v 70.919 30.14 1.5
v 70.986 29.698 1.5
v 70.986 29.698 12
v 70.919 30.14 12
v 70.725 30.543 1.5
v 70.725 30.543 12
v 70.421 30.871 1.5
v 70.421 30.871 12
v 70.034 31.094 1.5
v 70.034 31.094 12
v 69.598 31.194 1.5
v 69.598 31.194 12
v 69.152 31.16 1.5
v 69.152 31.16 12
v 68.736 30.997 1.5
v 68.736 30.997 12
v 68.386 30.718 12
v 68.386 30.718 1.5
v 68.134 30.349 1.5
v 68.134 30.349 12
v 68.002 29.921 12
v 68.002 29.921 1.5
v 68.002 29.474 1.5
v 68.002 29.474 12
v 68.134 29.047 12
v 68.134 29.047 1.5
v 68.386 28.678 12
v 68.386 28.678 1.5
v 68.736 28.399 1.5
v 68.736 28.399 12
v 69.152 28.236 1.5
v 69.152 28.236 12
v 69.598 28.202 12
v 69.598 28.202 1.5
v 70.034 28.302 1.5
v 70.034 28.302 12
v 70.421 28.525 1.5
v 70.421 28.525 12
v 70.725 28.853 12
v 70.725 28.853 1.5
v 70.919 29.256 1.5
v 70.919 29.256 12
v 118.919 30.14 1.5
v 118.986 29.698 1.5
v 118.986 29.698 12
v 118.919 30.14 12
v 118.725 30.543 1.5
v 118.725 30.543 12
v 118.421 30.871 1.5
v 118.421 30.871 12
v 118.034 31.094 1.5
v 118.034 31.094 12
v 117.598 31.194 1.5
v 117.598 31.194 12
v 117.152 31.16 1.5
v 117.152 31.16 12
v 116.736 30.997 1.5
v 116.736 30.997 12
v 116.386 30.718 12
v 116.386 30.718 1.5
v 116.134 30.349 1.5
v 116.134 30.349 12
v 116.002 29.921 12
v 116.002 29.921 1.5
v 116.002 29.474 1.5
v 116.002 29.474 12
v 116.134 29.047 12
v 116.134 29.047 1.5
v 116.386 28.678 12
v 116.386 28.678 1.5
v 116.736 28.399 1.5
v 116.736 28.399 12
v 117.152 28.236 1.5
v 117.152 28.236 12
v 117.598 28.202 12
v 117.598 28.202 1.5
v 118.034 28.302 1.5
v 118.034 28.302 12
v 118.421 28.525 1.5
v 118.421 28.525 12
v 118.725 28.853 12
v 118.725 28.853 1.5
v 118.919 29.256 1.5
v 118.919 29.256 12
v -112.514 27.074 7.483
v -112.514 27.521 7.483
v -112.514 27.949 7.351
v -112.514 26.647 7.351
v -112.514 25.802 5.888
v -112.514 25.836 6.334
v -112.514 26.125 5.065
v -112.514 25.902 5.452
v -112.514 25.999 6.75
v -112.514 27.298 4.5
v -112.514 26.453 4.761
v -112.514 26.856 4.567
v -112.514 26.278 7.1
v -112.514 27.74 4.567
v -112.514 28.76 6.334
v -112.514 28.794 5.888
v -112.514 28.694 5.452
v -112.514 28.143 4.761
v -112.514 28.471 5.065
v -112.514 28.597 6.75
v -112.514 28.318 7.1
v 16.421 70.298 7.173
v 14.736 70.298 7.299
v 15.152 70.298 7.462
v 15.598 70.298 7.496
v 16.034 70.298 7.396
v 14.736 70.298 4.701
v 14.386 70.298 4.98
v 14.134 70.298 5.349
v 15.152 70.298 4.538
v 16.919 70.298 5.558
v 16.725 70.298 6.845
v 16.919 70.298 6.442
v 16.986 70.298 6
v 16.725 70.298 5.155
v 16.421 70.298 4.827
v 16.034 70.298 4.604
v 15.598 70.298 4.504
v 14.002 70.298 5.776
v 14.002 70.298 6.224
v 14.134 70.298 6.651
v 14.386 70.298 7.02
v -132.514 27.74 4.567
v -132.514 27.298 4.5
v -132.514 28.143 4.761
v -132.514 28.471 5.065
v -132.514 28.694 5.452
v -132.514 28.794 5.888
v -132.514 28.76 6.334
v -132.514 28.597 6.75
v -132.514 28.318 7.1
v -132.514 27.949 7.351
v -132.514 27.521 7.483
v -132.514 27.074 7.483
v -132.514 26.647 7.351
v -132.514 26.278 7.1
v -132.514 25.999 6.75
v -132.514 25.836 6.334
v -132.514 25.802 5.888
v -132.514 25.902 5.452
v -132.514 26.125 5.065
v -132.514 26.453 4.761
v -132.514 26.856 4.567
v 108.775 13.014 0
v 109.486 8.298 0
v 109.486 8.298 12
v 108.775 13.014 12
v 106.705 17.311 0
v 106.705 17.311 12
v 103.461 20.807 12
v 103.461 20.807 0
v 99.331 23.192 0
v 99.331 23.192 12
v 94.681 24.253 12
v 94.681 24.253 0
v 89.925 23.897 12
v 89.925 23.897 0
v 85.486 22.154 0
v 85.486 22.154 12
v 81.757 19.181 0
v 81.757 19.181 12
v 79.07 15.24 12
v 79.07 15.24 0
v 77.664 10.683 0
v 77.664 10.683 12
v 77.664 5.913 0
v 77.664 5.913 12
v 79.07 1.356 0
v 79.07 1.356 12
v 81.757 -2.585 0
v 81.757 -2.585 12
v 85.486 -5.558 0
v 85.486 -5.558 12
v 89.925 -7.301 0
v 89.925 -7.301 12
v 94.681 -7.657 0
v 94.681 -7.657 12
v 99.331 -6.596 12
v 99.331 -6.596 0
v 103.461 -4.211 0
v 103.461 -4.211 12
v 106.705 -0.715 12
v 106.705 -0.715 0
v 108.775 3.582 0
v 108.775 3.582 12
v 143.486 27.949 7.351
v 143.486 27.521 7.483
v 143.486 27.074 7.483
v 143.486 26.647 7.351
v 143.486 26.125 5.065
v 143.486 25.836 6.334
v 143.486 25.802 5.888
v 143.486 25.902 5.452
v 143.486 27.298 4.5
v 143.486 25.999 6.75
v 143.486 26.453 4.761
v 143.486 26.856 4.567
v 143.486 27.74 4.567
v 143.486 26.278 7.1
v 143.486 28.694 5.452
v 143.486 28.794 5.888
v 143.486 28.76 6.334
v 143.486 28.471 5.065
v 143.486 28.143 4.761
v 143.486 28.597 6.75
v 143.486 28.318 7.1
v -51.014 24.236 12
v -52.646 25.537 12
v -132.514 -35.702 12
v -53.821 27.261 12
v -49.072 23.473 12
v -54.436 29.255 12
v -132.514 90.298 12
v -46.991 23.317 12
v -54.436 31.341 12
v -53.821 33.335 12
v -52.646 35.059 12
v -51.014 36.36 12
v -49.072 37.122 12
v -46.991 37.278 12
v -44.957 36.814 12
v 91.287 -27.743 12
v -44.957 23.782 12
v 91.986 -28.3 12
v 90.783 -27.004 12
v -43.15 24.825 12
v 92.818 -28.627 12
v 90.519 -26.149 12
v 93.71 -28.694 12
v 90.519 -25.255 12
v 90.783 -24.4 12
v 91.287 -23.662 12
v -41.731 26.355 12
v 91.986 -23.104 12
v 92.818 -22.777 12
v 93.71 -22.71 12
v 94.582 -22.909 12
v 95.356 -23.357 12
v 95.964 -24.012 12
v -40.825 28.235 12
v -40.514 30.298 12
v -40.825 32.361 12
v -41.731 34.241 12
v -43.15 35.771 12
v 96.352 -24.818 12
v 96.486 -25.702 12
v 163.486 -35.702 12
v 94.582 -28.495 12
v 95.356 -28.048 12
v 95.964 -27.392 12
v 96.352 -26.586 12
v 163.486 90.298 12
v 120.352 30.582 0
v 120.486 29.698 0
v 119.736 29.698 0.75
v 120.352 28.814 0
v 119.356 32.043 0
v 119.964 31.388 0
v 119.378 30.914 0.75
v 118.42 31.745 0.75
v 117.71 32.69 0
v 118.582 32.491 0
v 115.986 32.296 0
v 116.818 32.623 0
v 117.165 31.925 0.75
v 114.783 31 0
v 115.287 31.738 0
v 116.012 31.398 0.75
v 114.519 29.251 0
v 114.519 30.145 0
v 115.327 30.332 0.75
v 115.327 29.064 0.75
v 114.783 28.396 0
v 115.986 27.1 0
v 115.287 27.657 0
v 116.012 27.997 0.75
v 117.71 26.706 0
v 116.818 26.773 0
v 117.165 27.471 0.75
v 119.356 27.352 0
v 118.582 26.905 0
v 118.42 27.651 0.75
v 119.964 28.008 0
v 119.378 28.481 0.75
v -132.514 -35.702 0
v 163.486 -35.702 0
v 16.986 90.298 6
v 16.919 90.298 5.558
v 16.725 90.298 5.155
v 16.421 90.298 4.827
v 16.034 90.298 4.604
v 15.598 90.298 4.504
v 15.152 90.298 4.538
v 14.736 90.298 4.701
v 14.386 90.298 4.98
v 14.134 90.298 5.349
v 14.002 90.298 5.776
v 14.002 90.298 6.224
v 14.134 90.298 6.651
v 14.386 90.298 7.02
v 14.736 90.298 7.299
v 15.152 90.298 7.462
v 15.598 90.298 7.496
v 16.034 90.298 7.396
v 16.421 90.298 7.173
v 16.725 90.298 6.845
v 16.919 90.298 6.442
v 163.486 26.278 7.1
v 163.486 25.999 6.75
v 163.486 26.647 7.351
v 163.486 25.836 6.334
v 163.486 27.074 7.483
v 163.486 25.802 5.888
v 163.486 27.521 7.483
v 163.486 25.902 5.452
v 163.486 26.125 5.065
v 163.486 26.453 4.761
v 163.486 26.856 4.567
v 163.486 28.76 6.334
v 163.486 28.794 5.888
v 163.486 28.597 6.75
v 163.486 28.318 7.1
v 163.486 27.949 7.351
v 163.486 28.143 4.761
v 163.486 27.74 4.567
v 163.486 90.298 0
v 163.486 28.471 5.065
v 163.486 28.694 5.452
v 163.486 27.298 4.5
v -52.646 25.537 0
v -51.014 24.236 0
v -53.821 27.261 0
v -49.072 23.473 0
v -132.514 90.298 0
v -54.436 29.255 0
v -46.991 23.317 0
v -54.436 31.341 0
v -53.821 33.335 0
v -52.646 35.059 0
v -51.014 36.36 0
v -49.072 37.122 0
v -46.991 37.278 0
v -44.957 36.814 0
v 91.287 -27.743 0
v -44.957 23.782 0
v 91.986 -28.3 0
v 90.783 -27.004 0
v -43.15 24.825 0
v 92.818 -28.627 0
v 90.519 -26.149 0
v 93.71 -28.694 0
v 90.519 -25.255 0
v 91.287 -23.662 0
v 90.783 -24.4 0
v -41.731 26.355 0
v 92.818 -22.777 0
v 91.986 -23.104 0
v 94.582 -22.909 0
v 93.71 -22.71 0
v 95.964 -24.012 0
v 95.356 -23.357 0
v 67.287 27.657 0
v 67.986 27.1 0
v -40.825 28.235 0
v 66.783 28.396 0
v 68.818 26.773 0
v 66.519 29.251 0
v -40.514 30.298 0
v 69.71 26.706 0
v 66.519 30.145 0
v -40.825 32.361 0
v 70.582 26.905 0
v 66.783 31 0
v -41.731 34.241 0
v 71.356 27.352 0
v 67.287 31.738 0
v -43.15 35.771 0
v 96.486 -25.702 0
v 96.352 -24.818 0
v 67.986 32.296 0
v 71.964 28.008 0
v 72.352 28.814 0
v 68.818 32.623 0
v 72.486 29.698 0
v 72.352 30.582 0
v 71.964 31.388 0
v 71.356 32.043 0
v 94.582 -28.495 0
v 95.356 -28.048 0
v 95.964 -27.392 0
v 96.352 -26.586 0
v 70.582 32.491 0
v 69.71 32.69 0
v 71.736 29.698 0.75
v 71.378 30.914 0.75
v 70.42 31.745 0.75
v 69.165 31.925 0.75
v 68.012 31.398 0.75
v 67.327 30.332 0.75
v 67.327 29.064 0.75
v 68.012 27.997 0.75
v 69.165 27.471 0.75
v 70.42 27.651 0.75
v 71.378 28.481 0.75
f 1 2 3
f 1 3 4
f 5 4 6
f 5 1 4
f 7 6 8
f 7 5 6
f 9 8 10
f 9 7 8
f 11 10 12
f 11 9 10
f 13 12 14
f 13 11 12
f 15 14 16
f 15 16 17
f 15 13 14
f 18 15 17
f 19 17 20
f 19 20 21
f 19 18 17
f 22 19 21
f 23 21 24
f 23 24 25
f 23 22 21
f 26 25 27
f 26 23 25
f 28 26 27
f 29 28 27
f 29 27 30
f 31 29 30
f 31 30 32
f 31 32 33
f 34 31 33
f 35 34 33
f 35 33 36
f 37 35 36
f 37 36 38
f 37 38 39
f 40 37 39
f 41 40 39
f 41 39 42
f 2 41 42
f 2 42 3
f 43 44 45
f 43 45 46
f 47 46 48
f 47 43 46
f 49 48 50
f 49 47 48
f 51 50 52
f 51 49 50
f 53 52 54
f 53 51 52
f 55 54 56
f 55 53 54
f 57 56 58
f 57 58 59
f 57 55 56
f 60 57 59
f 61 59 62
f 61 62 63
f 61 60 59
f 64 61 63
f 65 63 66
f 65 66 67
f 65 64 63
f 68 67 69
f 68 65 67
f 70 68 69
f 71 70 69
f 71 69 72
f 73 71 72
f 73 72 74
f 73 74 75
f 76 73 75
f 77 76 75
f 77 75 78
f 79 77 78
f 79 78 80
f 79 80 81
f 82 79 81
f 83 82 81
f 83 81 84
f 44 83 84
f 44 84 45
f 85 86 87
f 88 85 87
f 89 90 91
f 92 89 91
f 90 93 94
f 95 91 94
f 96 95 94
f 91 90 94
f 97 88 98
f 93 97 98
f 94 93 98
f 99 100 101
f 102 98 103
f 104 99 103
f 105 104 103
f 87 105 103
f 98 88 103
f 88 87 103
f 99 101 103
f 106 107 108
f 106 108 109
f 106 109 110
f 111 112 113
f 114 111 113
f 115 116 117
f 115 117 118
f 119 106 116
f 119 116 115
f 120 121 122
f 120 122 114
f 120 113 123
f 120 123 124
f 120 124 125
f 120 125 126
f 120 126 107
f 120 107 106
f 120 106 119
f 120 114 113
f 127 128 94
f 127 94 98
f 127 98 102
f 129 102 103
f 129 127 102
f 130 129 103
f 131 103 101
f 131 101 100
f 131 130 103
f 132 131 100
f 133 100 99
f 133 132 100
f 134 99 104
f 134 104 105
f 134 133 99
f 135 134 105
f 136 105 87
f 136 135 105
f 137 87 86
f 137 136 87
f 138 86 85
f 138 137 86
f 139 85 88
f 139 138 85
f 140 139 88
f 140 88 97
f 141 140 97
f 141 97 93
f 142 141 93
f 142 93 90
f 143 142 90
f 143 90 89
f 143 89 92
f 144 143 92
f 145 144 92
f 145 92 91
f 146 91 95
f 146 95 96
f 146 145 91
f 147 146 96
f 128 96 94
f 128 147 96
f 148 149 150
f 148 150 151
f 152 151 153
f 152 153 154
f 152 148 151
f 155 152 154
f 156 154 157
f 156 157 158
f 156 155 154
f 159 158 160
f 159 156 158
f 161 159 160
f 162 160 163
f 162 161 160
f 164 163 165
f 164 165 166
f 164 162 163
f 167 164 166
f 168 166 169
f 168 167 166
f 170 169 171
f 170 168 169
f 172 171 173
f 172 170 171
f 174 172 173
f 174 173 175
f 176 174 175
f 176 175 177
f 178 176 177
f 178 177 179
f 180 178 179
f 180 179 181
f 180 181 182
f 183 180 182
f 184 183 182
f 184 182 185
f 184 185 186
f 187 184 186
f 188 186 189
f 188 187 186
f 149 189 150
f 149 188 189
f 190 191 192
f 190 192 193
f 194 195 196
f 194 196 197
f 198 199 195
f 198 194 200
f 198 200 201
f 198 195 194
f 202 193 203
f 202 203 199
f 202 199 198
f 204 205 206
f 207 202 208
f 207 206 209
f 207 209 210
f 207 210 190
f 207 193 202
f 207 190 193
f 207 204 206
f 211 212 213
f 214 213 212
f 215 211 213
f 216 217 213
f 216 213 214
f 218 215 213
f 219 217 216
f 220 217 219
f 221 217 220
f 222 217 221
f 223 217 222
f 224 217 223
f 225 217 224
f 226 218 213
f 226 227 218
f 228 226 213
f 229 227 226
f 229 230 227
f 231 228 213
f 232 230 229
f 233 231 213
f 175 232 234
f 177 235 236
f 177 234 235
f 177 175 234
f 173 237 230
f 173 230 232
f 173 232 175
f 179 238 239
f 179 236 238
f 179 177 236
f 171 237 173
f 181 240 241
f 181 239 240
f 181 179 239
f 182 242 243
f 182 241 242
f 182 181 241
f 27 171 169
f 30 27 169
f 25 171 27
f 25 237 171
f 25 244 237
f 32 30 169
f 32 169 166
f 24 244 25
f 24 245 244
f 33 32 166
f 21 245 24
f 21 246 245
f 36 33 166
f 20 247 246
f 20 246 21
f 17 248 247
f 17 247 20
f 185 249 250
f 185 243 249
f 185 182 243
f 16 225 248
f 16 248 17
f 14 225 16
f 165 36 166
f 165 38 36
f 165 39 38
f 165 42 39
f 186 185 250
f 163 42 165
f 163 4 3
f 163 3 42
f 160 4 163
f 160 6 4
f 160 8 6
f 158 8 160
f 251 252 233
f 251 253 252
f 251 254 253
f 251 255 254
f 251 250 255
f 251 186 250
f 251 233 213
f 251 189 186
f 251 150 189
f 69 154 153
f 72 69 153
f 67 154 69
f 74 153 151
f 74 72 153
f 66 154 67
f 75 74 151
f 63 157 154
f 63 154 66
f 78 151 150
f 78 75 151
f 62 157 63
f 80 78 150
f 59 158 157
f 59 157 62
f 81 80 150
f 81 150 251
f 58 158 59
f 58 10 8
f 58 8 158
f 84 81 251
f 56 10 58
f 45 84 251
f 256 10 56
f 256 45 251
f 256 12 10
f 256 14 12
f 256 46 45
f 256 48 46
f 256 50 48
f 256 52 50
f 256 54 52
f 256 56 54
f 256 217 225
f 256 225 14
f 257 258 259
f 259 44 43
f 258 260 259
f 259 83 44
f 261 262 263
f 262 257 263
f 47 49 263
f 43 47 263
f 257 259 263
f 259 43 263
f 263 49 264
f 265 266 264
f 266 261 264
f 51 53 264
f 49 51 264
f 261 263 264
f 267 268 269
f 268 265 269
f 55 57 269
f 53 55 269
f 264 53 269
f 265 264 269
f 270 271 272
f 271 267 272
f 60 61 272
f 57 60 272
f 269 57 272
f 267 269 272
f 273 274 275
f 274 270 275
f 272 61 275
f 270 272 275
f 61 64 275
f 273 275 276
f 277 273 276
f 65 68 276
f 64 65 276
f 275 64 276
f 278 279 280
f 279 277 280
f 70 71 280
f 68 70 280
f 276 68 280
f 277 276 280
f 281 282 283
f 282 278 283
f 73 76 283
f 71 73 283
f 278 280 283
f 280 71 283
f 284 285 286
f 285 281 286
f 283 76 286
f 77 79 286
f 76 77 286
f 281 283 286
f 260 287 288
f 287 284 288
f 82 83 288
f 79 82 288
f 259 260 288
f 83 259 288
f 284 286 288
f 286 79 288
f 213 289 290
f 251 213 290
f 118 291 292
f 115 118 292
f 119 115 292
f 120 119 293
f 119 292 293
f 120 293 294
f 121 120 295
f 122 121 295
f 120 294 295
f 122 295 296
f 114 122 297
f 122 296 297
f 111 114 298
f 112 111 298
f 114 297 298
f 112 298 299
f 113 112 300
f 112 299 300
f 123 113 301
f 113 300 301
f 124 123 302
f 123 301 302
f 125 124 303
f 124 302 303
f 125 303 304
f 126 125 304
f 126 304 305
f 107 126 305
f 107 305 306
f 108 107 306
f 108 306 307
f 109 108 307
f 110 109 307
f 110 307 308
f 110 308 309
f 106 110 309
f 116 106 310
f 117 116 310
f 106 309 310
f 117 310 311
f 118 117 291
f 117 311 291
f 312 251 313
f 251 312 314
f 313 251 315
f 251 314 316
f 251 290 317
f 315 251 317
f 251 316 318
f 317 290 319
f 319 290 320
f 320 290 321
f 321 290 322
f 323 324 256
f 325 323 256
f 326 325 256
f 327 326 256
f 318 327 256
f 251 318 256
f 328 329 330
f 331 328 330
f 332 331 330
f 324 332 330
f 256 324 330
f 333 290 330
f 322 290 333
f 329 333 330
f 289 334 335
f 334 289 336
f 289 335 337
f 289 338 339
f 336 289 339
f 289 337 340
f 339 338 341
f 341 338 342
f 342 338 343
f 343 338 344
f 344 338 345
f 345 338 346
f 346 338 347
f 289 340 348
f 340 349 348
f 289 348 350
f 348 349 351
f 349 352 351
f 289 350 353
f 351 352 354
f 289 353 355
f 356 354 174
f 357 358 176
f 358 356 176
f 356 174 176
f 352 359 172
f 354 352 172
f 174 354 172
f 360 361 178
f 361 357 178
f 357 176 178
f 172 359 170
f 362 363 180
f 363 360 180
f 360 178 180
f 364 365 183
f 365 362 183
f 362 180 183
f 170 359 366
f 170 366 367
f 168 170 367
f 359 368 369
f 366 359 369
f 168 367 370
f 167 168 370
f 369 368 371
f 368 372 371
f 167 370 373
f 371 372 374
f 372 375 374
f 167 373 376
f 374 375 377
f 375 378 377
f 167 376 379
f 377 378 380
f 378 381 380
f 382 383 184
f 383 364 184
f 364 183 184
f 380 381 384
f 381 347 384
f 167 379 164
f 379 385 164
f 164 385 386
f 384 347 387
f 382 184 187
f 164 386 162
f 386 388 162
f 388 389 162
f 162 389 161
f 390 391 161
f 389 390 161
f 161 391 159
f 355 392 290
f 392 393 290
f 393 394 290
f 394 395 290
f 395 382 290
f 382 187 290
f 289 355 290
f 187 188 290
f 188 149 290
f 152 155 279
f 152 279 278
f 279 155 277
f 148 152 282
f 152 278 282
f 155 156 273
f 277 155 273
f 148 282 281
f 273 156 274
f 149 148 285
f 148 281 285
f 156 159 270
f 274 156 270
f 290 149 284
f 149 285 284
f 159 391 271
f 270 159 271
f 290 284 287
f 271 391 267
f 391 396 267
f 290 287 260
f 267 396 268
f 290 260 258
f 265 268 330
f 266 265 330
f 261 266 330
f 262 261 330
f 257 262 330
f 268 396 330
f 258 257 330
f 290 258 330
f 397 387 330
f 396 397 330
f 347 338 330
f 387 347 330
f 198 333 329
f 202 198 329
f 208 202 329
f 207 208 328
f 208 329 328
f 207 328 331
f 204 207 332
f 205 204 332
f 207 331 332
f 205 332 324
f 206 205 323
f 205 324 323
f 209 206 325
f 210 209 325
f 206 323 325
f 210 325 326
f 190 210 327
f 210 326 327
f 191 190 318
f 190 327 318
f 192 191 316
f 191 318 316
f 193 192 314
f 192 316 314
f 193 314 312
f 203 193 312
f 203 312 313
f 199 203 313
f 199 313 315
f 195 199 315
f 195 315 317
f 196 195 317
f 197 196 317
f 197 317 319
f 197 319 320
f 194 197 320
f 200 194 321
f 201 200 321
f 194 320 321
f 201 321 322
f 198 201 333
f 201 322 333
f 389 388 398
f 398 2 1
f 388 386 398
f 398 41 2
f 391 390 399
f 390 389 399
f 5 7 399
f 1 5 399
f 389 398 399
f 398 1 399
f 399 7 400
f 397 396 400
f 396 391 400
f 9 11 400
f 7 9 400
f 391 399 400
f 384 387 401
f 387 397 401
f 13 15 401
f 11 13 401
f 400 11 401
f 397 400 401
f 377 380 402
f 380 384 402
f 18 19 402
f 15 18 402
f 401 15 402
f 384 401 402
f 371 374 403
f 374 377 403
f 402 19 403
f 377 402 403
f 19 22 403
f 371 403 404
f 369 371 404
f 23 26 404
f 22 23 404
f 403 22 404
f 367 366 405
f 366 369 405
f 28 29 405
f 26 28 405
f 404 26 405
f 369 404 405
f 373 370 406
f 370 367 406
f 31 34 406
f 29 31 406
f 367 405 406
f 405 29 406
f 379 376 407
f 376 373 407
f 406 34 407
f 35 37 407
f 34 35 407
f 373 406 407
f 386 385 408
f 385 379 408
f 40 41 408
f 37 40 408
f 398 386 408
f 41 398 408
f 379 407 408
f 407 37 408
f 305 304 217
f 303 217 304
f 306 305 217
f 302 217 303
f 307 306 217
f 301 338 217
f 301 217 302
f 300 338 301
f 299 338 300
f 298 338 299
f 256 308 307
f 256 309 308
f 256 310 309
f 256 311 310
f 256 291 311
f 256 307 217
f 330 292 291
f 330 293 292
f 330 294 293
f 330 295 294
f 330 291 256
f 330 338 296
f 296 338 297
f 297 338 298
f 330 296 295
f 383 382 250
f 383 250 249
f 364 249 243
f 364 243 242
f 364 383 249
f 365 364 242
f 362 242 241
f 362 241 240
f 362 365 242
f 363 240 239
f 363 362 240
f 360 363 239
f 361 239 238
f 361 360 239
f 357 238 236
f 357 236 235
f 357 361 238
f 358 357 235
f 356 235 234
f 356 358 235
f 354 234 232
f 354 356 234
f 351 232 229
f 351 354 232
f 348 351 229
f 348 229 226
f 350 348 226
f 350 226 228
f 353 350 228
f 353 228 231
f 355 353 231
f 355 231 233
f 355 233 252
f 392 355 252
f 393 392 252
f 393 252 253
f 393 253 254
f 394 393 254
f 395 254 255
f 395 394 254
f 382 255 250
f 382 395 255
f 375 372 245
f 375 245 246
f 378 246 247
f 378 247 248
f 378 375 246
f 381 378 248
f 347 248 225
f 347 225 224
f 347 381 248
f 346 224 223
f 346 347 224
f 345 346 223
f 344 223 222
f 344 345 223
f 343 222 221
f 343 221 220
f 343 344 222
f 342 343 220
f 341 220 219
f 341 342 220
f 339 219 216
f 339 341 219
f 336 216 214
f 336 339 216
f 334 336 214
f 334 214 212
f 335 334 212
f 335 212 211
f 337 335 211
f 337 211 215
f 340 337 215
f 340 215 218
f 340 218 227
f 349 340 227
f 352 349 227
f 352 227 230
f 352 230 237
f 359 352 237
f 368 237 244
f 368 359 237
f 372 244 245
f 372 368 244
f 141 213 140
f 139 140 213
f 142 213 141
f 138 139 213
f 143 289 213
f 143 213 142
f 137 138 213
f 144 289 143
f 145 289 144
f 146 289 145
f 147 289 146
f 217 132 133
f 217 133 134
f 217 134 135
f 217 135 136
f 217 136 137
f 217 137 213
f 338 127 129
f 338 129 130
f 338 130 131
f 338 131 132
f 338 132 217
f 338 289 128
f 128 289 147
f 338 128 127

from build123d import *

# Parameters (mm, degrees)
SKETCH1_W           = 296
SKETCH1_H           = 126
SKETCH1_R           = 16
SKETCH1_R_2         = 7
SKETCH1_R_3         = 1.5
SKETCH1_R_4         = 3
BOSS_EXTRUDE1_DEPTH = 12
CUT_EXTRUDE1_START  = 90.297917
SKETCH2_R           = 1.5
CUT_EXTRUDE1_DEPTH  = 20
CUT_EXTRUDE3_START  = 163.485661
SKETCH3_R           = 1.5
CUT_EXTRUDE3_DEPTH  = 20
CUT_EXTRUDE4_START  = -132.514339
SKETCH3_2_R         = 1.5
CUT_EXTRUDE4_DEPTH  = 20
SKETCH4_R           = 3
CUT_EXTRUDE5_DEPTH  = 3
CUT_EXTRUDE5_TAPER  = 45


with BuildPart() as part:
    # Sketch1 → Boss-Extrude1 (new body)
    with BuildSketch(Plane.XY):
        with Locations((15.485661099, 27.29791691)):
            Rectangle(SKETCH1_W, SKETCH1_H)
        with Locations((93.485661099, 8.29791691)):
            Circle(SKETCH1_R, mode=Mode.SUBTRACT)
        with Locations((-47.514338901, 30.29791691)):
            Circle(SKETCH1_R_2, mode=Mode.SUBTRACT)
        with Locations((69.485661099, 29.69791691)):
            Circle(SKETCH1_R_3, mode=Mode.SUBTRACT)
        with Locations((117.485661099, 29.69791691)):
            Circle(SKETCH1_R_3, mode=Mode.SUBTRACT)
        with Locations((93.485661099, -25.70208309)):
            Circle(SKETCH1_R_4, mode=Mode.SUBTRACT)
    extrude(amount=BOSS_EXTRUDE1_DEPTH)

    # Sketch2 → Cut-Extrude1 (cut)
    with BuildSketch(Plane(origin=(0, 0, 0), x_dir=(1, 0, 0), z_dir=(0, 1, 0)).offset(CUT_EXTRUDE1_START)):
        with Locations((15.485661099, -6)):
            Circle(SKETCH2_R)
    extrude(amount=-CUT_EXTRUDE1_DEPTH, mode=Mode.SUBTRACT)

    # Sketch3 → Cut-Extrude3 (cut)
    with BuildSketch(Plane(origin=(0, 0, 0), x_dir=(0, 0, -1), z_dir=(1, 0, 0)).offset(CUT_EXTRUDE3_START)):
        with Locations((-6, 27.29791691)):
            Circle(SKETCH3_R)
    extrude(amount=-CUT_EXTRUDE3_DEPTH, mode=Mode.SUBTRACT)

    # Sketch3<2> → Cut-Extrude4 (cut)
    with BuildSketch(Plane(origin=(0, 0, 0), x_dir=(0, 0, -1), z_dir=(1, 0, 0)).offset(CUT_EXTRUDE4_START)):
        with Locations((-6, 27.29791691)):
            Circle(SKETCH3_2_R)
    extrude(amount=CUT_EXTRUDE4_DEPTH, mode=Mode.SUBTRACT)

    # Sketch4 → Cut-Extrude5 (cut)
    with BuildSketch(Plane.XY):
        with Locations((117.485661099, 29.69791691)):
            Circle(SKETCH4_R)
        with Locations((69.485661099, 29.69791691)):
            Circle(SKETCH4_R)
    extrude(amount=CUT_EXTRUDE5_DEPTH, taper=CUT_EXTRUDE5_TAPER, mode=Mode.SUBTRACT)


solid = part.part
